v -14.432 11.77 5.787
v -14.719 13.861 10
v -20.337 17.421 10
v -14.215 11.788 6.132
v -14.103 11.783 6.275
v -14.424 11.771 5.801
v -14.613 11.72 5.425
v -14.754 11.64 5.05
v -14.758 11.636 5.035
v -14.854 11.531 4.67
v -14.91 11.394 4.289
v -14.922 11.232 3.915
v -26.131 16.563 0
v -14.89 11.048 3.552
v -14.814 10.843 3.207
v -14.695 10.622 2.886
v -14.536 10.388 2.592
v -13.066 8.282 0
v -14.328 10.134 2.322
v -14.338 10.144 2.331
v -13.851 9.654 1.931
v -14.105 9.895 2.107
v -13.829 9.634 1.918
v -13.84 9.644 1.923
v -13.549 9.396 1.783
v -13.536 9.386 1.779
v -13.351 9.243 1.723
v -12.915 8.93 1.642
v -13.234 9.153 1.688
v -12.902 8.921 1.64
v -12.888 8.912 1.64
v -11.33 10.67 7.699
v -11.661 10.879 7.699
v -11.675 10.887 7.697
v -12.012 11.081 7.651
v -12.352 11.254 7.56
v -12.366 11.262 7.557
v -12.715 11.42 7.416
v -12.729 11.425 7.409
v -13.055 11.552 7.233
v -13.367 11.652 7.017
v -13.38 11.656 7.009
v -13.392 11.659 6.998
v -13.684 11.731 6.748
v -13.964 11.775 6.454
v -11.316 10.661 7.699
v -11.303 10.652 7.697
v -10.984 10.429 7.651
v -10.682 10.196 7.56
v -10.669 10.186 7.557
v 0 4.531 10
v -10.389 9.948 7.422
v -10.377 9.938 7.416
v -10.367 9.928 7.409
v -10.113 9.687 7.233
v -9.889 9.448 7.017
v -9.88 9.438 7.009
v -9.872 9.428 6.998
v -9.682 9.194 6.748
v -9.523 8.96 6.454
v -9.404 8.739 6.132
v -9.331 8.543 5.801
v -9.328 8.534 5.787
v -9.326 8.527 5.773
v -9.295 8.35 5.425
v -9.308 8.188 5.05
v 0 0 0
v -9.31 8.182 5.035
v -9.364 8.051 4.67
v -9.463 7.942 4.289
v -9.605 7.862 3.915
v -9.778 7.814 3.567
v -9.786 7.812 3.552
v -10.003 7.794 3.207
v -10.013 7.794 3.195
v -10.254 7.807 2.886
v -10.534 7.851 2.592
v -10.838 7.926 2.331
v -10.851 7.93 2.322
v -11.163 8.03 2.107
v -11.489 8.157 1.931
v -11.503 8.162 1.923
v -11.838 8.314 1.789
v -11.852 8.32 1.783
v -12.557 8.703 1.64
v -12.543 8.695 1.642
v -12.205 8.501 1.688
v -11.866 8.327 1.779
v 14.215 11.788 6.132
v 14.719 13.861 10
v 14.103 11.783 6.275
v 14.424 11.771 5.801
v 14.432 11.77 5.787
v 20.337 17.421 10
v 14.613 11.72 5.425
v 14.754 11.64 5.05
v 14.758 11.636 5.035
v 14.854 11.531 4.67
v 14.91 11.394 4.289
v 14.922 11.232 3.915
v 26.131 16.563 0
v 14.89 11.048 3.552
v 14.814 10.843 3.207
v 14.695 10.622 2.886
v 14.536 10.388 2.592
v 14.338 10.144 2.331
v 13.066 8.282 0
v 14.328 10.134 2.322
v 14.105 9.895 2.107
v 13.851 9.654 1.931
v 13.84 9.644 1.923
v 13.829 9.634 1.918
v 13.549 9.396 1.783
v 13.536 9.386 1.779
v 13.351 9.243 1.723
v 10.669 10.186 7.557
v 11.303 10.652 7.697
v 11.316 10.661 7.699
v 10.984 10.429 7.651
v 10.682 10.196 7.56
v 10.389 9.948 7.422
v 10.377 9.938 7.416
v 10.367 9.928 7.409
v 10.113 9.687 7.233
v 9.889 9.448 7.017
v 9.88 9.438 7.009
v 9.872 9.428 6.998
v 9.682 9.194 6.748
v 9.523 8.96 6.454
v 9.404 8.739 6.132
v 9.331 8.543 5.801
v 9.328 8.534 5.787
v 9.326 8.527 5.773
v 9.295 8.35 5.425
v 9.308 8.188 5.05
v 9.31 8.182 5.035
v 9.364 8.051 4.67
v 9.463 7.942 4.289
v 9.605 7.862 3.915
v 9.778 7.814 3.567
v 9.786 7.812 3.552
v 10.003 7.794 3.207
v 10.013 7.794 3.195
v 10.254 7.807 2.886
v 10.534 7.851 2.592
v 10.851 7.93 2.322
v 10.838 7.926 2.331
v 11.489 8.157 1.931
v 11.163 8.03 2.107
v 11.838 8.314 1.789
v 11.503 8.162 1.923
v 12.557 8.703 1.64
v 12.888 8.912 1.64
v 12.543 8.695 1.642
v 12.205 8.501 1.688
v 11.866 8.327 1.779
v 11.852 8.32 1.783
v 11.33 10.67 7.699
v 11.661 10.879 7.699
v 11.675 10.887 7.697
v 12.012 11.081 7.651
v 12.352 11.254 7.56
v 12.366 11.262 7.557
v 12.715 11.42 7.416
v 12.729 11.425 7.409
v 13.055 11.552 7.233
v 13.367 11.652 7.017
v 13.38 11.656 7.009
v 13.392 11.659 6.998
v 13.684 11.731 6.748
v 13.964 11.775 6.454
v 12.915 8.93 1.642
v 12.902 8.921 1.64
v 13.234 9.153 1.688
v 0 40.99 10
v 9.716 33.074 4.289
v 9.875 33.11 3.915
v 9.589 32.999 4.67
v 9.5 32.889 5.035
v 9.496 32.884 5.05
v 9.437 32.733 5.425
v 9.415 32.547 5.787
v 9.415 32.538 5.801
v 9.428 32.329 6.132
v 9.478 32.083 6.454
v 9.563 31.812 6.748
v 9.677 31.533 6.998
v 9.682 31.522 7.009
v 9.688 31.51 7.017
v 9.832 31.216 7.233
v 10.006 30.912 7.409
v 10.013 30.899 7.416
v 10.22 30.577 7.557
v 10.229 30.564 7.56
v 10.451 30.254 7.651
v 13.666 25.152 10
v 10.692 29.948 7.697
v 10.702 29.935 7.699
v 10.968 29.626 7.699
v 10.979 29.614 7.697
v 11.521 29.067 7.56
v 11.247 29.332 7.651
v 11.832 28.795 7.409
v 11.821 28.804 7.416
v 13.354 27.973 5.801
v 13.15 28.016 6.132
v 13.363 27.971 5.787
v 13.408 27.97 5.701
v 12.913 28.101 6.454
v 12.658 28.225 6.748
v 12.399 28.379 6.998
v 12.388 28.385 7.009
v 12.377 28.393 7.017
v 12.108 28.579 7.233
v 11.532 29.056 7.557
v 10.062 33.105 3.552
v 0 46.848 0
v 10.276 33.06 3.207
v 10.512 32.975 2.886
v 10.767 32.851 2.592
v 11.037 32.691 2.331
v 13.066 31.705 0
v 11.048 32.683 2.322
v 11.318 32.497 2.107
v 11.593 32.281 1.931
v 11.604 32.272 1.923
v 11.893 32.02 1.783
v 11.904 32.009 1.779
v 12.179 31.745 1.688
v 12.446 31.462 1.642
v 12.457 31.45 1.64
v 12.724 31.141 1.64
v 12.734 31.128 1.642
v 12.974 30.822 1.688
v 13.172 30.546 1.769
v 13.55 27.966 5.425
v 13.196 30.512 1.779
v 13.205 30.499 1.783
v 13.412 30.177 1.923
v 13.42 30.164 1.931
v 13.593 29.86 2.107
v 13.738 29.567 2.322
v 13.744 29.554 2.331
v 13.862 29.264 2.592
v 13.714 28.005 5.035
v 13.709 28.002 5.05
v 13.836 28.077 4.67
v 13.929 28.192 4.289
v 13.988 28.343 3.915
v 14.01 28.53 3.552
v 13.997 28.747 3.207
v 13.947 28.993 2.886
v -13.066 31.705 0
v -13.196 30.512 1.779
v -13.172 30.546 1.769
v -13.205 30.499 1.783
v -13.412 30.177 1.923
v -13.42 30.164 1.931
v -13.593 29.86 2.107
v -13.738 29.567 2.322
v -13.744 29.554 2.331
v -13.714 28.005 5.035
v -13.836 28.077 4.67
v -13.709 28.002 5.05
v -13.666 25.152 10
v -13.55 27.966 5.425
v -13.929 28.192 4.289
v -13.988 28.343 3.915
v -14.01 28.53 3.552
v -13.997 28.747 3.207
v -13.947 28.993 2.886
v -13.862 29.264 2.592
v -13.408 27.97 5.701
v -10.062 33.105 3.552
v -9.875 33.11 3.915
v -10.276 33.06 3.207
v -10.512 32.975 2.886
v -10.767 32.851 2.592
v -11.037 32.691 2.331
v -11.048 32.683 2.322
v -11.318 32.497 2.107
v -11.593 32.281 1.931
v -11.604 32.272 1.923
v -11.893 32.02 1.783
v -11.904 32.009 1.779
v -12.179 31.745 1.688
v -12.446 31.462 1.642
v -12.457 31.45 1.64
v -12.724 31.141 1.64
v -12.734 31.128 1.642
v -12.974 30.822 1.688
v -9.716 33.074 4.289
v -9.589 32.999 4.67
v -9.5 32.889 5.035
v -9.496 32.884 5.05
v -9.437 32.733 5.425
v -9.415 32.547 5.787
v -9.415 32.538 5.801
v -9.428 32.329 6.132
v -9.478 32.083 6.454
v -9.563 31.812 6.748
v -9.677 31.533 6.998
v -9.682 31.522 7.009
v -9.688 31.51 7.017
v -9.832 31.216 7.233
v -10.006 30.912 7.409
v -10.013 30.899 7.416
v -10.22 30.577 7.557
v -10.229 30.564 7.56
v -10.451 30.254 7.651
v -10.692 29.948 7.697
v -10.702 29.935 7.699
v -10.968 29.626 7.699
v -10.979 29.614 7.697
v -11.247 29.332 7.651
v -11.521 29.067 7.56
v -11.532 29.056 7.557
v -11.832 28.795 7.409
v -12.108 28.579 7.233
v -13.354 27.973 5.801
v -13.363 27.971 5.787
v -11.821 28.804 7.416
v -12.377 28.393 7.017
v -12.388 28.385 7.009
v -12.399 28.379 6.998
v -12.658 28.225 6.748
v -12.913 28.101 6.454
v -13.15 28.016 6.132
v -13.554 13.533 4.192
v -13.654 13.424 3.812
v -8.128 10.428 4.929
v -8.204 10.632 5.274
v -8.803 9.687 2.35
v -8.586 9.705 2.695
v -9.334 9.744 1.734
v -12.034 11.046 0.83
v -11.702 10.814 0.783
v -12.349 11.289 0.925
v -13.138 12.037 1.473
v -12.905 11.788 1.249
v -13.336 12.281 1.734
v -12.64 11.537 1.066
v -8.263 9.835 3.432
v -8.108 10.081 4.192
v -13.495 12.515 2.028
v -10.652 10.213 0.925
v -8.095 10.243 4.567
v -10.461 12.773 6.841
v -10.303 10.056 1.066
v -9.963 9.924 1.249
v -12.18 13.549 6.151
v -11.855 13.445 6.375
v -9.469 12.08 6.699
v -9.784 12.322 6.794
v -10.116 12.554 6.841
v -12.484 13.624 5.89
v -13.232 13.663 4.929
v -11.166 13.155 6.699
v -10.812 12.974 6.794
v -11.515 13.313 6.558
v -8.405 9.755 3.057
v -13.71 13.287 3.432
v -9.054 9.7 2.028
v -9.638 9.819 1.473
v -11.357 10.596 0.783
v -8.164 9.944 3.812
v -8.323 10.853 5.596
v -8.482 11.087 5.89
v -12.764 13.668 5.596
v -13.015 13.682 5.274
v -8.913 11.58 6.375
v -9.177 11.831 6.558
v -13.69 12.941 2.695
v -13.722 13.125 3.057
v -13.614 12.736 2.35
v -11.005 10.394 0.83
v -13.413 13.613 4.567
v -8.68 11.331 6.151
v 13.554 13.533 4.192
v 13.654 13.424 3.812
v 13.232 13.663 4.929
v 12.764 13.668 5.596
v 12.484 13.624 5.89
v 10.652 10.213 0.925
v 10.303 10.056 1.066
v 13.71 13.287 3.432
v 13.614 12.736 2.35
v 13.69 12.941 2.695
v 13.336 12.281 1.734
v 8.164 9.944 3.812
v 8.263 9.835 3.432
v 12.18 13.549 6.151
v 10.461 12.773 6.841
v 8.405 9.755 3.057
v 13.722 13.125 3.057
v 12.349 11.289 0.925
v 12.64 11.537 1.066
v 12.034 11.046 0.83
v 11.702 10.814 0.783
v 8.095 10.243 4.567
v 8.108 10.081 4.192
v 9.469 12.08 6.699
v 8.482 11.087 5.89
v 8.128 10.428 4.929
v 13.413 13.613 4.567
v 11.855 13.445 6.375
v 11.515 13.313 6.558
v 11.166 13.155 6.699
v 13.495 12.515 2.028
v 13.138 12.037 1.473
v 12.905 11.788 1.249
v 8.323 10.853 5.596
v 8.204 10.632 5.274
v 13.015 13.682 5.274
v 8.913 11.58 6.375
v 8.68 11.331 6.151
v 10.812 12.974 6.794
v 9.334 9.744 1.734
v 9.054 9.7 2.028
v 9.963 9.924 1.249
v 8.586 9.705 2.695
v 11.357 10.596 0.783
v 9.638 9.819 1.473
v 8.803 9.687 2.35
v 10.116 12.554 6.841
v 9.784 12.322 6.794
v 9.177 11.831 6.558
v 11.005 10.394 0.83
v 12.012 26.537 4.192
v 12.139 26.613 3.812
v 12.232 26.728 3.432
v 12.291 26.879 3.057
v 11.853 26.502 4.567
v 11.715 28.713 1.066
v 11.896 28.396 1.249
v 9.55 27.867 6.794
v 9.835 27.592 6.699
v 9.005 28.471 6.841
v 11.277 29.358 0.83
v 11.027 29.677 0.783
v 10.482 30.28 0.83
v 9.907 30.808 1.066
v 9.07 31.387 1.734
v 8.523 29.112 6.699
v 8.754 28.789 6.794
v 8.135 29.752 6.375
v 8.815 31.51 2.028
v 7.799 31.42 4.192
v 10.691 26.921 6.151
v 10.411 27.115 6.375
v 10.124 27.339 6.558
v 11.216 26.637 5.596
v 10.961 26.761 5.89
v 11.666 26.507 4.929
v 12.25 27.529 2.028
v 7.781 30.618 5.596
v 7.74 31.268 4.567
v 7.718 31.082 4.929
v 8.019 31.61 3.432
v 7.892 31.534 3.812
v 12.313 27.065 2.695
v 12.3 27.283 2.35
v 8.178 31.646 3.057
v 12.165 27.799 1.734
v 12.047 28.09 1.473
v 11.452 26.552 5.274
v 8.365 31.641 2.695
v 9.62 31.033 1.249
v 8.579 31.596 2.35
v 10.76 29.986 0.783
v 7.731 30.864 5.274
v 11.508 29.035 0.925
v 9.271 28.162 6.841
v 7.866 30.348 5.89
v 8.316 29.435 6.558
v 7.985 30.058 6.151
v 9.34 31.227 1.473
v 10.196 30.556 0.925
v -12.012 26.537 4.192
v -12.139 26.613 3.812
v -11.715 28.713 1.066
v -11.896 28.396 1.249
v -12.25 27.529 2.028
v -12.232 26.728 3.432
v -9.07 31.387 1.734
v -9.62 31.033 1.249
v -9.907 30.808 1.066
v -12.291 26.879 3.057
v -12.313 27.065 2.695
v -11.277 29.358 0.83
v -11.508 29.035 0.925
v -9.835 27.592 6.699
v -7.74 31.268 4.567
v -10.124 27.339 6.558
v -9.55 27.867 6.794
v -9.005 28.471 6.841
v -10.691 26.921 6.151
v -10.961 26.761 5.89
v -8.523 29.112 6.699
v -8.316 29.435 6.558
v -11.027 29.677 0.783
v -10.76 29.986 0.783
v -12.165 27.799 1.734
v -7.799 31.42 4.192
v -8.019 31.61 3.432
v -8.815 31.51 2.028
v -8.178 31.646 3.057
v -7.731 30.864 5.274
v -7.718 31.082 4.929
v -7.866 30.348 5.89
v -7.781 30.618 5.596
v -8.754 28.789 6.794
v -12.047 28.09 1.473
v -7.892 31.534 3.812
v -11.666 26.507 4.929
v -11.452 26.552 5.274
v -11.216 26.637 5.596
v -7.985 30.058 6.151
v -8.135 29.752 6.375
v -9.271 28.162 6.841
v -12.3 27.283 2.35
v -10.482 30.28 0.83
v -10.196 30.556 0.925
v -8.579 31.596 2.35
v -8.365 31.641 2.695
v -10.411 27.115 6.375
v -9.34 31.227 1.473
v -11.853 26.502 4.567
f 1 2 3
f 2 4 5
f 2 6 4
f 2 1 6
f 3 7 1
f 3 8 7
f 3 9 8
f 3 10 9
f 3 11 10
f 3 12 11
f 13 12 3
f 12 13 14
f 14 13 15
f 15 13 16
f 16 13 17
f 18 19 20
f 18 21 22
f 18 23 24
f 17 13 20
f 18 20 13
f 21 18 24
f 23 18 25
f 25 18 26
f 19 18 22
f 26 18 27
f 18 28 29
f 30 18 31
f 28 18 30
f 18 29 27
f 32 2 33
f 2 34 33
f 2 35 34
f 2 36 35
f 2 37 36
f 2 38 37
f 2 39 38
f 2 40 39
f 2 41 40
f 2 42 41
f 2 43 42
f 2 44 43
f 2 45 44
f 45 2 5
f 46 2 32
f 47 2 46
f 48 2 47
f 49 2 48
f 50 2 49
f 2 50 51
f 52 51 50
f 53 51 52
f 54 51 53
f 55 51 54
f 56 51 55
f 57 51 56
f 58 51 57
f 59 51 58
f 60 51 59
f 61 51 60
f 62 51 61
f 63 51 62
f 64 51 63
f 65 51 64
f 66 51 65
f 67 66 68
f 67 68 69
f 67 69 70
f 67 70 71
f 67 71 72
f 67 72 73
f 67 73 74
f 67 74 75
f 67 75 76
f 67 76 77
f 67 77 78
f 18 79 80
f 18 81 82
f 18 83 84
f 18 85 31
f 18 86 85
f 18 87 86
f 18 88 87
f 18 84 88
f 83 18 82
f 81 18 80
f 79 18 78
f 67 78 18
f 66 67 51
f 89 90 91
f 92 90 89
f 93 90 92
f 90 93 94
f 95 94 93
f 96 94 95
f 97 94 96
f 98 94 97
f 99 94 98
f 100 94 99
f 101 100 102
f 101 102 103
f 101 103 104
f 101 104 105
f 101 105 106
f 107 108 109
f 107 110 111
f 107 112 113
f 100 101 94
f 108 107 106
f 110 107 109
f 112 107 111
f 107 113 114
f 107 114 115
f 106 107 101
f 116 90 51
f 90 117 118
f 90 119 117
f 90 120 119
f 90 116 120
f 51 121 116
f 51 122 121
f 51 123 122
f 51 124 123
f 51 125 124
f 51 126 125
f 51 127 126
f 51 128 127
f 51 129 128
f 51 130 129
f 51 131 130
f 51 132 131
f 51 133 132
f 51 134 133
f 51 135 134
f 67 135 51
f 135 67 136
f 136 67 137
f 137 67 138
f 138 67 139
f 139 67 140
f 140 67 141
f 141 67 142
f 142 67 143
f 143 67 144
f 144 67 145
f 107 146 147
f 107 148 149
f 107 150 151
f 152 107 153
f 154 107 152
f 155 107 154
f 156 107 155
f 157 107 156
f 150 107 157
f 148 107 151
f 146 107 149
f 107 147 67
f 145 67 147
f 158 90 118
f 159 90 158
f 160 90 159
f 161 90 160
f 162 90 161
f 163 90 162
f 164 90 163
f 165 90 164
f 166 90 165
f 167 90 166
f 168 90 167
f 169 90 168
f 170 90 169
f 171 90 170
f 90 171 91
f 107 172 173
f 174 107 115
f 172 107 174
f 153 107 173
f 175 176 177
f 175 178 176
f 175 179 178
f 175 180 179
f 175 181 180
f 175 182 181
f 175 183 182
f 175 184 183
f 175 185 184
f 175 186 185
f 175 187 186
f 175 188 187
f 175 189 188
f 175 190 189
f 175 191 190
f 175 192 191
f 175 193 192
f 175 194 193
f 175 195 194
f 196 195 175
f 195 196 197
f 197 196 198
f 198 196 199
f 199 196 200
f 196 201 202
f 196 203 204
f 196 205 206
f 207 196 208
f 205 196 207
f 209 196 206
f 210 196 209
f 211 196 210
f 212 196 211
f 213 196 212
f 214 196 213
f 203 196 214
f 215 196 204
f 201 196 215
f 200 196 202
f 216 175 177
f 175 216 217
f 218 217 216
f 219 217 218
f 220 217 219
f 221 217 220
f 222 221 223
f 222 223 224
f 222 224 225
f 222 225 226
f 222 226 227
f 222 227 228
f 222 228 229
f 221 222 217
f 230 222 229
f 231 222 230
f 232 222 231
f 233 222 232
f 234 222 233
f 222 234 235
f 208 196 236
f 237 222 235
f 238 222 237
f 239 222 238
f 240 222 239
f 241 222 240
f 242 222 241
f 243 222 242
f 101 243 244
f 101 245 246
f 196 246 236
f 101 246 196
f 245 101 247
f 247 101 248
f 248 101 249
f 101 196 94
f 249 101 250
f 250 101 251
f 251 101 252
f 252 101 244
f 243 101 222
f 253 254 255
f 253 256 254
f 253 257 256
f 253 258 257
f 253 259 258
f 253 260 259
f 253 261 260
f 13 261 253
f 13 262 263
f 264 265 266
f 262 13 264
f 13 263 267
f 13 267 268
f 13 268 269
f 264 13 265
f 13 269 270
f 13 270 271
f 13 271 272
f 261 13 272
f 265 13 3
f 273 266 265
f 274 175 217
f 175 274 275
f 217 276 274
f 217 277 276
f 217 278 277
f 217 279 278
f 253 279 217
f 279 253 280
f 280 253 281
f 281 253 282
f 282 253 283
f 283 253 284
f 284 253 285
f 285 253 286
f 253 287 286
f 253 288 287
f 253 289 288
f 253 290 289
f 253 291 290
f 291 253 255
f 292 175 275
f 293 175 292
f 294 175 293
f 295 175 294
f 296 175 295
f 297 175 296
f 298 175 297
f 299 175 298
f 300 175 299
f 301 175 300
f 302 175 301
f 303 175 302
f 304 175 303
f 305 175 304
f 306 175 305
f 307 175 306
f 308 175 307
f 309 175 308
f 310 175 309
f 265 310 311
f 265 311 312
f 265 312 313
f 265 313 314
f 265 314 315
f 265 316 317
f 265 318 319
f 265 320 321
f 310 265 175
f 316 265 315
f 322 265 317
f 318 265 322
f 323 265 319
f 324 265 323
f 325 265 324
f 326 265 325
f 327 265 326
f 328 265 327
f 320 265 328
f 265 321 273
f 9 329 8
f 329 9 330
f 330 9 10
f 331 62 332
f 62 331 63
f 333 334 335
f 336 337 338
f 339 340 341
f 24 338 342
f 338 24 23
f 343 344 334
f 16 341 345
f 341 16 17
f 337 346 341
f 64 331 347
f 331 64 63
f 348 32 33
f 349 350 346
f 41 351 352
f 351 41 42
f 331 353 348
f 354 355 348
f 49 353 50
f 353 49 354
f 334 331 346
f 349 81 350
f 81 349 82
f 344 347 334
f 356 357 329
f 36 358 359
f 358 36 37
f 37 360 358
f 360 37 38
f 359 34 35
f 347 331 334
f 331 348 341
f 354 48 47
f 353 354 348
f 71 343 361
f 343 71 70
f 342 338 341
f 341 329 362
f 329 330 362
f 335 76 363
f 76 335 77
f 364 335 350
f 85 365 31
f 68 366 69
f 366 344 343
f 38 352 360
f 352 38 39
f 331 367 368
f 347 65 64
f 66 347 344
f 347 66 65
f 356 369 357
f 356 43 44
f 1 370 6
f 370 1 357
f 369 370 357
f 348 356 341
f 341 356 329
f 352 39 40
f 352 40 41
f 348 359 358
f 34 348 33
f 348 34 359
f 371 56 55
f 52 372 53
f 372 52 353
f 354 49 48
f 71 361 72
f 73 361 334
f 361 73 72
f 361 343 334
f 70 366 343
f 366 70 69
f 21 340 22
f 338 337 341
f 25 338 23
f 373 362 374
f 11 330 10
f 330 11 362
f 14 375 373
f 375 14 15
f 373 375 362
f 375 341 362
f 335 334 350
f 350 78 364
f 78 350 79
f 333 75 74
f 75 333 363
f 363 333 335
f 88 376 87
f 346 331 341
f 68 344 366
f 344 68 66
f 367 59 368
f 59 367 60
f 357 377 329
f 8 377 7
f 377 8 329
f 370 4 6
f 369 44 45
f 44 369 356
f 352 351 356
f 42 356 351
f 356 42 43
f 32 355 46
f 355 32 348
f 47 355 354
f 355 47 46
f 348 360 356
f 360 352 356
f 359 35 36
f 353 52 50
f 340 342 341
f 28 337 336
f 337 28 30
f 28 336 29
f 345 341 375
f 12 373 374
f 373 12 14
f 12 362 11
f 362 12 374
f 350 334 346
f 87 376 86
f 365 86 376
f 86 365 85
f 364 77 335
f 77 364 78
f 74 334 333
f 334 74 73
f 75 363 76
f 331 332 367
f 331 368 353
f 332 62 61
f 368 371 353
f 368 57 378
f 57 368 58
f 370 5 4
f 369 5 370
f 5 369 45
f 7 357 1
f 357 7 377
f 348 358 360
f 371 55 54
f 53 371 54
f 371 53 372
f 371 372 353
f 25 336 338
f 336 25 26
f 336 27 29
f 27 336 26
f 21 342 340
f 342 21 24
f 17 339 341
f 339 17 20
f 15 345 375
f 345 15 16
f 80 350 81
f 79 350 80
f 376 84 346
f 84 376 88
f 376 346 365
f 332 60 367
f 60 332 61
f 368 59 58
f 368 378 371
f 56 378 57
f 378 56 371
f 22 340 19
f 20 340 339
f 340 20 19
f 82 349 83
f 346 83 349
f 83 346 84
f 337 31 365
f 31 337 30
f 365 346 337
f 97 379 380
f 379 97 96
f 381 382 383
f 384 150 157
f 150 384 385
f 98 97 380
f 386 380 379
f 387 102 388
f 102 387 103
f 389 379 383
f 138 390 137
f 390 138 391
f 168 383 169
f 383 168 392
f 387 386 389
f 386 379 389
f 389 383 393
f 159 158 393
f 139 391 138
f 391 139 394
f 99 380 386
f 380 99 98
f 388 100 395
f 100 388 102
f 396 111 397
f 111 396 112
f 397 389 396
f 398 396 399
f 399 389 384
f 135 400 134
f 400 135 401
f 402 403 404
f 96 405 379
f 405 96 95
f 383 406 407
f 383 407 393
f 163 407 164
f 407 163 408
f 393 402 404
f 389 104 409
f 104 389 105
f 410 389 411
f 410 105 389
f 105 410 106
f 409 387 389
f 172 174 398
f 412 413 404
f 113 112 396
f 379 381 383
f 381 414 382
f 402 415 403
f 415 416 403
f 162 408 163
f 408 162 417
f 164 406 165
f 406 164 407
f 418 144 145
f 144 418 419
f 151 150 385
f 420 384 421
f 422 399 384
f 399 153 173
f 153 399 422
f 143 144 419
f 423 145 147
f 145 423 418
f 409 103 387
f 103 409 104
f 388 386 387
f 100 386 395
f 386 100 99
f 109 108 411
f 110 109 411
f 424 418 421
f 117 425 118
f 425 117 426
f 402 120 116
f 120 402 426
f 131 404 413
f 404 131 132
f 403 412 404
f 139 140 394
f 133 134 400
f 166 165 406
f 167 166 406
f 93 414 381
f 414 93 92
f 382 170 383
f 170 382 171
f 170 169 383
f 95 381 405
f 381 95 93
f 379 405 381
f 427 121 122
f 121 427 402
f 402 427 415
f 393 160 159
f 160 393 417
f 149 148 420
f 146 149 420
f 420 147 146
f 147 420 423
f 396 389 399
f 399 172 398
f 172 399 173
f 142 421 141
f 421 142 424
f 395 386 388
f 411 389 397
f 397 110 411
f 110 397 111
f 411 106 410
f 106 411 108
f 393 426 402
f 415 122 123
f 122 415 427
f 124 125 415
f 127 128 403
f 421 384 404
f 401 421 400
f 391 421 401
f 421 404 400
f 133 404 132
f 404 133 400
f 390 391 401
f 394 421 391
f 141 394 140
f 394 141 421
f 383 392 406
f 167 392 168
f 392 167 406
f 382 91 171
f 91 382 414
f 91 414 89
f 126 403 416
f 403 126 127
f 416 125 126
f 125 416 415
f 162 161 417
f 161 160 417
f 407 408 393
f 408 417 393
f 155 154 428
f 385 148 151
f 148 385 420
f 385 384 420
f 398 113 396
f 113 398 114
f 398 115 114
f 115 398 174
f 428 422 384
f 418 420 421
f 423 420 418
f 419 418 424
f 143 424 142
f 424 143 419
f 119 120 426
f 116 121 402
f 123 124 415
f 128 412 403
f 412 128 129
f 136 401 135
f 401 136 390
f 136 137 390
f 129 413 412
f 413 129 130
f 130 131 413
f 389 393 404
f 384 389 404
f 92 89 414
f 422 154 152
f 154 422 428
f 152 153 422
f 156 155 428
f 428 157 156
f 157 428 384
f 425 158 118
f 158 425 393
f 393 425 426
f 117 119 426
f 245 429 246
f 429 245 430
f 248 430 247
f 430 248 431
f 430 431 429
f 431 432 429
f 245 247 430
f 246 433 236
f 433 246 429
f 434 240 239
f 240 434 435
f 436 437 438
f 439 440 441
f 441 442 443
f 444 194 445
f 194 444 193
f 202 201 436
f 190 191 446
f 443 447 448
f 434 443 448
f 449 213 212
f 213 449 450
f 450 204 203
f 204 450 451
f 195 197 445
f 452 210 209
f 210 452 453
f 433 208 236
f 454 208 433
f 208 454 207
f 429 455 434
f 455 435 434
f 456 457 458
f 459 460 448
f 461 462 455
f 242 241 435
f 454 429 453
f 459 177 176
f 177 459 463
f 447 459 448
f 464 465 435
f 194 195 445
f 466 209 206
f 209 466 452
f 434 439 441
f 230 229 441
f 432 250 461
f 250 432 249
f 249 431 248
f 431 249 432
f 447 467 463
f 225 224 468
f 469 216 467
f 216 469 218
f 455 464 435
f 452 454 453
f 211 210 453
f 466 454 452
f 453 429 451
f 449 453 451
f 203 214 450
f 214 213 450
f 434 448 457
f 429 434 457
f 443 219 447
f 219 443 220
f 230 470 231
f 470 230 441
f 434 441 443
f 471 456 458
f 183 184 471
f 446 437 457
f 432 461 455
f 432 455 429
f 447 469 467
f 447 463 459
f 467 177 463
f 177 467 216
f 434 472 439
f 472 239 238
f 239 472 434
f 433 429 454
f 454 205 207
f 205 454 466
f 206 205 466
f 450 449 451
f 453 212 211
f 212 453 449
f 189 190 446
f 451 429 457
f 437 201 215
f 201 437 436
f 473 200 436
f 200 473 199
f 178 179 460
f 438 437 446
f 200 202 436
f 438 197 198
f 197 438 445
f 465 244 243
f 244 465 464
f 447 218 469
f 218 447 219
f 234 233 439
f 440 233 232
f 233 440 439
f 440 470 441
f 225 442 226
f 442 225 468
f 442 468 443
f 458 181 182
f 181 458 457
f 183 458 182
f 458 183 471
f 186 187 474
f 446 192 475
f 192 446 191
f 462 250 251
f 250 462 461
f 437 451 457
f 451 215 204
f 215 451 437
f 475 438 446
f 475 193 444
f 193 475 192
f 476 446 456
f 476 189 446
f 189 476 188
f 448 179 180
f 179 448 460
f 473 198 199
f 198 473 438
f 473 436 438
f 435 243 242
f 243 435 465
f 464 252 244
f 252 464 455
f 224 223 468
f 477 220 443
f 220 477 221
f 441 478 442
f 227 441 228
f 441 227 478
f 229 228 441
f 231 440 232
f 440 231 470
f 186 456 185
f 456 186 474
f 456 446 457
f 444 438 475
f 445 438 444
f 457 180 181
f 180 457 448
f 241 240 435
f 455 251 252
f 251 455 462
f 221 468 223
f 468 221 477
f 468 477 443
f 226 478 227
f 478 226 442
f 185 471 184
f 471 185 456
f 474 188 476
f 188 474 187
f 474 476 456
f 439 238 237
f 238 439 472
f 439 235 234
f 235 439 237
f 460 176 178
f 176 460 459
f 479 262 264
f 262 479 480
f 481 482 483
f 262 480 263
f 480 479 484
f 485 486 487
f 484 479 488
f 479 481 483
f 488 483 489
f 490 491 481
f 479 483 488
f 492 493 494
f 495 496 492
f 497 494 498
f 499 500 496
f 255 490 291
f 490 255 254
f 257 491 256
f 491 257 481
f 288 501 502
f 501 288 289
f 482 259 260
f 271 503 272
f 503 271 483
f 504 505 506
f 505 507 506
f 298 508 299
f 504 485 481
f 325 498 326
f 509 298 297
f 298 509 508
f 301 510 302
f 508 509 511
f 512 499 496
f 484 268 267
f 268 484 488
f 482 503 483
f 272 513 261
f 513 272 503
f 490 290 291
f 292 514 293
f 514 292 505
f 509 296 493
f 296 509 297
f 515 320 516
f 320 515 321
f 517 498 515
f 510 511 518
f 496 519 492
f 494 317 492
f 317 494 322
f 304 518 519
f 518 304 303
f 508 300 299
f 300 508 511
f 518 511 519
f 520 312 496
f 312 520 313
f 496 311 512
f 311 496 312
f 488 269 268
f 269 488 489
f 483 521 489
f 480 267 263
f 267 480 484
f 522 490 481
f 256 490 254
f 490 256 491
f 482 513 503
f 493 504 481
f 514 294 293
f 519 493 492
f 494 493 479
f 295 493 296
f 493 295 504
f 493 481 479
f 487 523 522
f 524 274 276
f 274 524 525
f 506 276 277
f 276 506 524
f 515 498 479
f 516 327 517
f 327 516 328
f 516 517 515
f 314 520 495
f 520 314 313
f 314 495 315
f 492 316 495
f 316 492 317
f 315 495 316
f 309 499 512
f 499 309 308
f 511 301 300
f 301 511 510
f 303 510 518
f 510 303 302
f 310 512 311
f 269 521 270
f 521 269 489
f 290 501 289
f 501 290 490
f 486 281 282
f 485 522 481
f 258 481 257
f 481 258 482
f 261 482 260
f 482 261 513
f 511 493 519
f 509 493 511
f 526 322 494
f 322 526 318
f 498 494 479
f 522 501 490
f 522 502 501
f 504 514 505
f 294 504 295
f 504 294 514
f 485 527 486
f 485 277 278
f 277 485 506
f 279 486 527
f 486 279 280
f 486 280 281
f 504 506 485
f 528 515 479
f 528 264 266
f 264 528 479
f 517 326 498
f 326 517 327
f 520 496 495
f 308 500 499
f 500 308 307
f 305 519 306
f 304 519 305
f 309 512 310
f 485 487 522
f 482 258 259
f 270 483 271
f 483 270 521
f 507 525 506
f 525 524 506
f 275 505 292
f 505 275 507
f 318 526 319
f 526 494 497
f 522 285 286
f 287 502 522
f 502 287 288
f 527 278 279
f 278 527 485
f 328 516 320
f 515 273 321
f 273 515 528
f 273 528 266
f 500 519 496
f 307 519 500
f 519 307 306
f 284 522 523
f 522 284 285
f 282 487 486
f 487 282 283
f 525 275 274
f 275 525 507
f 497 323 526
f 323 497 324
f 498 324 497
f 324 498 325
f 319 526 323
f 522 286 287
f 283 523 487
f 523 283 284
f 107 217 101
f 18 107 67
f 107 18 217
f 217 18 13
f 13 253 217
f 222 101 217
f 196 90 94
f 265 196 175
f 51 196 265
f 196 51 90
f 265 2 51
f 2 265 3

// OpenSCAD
/*
	Deltoidal icositetrahedron with magnets tile, by eshira
	Dihedral angle: 138° 7' 5"
	
	24 tiles total are required.
	Use axially aligned magnets (4 per tile).
	Magnet mounting per tile MUST BE IDENTICAL!
	Following the following constraints:
		-Two parallel sides have the same pole facing outward
		-Two adjacent sides have the opposite pole facing outward
    See the diagram included for more help.

*/

$fn=50;

//User Defined Variables
longside = 40; //side length for longer side
thickness = 10; //how thick (z dimension) the tile is
magnetdepth = 2.5; //depth of the magnet holes; tailor this to suit your 3d printer
magnetdiam = 6.5; //diameter of the magnet holes; tailor this to suit your 3d printer

//Other Variables
dihedral = acos(-(7+4*sqrt(2))/17); //dihedral angle
shortside = longside*(4+sqrt(2))/7; //short side of kite
ldiag = (longside/7)*sqrt(46+15*sqrt(2)); //Long diagonal of kite
theta = asin((sqrt(29-2*sqrt(2)))/(2*(4-sqrt(2)))); //Angle between long and short sides
phi = asin(longside*sin(theta)/ldiag); // Half the angle between the two short sides

//Main
tile();

//Modules
module tile() {
    difference(){
        mainbody();
        union(){
            chamfers();
            magnets();
        }
    }
}

module mainbody(){
	linear_extrude(height = thickness ) {
        polygon([[0,0],[-shortside*cos(90-phi),shortside*sin(90-phi)],[0,ldiag],[shortside*cos(90-phi),shortside*sin(90-phi)]]);
	}
}

module chamfers() {
	rotate([(180-dihedral)/2,0,phi+90]){
		linear_extrude(center=true, height=thickness*10) {
			polygon([[-5,0],[-5,thickness],[shortside+5,thickness],[shortside+5,0]]);
		}
	}
    
    mirror([1,0,0]){
        rotate([(180-dihedral)/2,0,phi+90]){
            linear_extrude(center=true, height=thickness*10) {
                polygon([[-5,0],[-5,thickness],[shortside+5,thickness],[shortside+5,0]]);
            }
        }
    }
    translate([0,ldiag,0]){
    	rotate([(180-dihedral)/2,0,-phi-theta+90]){
            linear_extrude(center=true, height=thickness*10) {
                polygon([[-5,0],[-5,thickness],[longside+5,thickness],[longside+5,0]]);
            }
        }
    }
    
    mirror([1,0,0]){
        translate([0,ldiag,0]){
            rotate([(180-dihedral)/2,0,-phi-theta+90]){
                linear_extrude(center=true, height=thickness*10) {
                    polygon([[-5,0],[-5,thickness],[longside+5,thickness],[longside+5,0]]);
                }
            }
        }
    }
}

module magnets() {
    extra=0.1;
    
    translate([-0.5*shortside*cos(90-phi),0.5*shortside*sin(90-phi),0]){
        rotate([180-dihedral/2,0,phi+90]){
            translate([0,thickness/2,-extra]) {
                linear_extrude(center=false, height=magnetdepth) {
                    circle(magnetdiam/2);
                }
            }
        }
    }
    
    mirror([1,0,0]){
        translate([-0.5*shortside*cos(90-phi),0.5*shortside*sin(90-phi),0]){
            rotate([180-dihedral/2,0,phi+90]){
                translate([0,thickness/2,-extra]) {
                    linear_extrude(center=false, height=magnetdepth) {
                        circle(magnetdiam/2);
                    }
                }
            }
        }
    }
    
    mirror([0,0,0]){
        translate([0.5*longside*cos(theta-(180-2*phi)/2),0.5*longside*sin(theta-(180-2*phi)/2)+shortside*sin(90-phi),0]){
            rotate([180-dihedral/2,0,-90+theta/2]){
                translate([0,thickness/2,-extra]) {
                    linear_extrude(center=false, height=magnetdepth) {
                        circle(magnetdiam/2);
                    }
                }
            }
        }
    }    
    
    mirror([1,0,0]){
        translate([0.5*longside*cos(theta-(180-2*phi)/2),0.5*longside*sin(theta-(180-2*phi)/2)+shortside*sin(90-phi),0]){
            rotate([180-dihedral/2,0,-90+theta/2]){
                translate([0,thickness/2,-extra]) {
                    linear_extrude(center=false, height=magnetdepth) {
                        circle(magnetdiam/2);
                    }
                }
            }
        }
    } 
}
